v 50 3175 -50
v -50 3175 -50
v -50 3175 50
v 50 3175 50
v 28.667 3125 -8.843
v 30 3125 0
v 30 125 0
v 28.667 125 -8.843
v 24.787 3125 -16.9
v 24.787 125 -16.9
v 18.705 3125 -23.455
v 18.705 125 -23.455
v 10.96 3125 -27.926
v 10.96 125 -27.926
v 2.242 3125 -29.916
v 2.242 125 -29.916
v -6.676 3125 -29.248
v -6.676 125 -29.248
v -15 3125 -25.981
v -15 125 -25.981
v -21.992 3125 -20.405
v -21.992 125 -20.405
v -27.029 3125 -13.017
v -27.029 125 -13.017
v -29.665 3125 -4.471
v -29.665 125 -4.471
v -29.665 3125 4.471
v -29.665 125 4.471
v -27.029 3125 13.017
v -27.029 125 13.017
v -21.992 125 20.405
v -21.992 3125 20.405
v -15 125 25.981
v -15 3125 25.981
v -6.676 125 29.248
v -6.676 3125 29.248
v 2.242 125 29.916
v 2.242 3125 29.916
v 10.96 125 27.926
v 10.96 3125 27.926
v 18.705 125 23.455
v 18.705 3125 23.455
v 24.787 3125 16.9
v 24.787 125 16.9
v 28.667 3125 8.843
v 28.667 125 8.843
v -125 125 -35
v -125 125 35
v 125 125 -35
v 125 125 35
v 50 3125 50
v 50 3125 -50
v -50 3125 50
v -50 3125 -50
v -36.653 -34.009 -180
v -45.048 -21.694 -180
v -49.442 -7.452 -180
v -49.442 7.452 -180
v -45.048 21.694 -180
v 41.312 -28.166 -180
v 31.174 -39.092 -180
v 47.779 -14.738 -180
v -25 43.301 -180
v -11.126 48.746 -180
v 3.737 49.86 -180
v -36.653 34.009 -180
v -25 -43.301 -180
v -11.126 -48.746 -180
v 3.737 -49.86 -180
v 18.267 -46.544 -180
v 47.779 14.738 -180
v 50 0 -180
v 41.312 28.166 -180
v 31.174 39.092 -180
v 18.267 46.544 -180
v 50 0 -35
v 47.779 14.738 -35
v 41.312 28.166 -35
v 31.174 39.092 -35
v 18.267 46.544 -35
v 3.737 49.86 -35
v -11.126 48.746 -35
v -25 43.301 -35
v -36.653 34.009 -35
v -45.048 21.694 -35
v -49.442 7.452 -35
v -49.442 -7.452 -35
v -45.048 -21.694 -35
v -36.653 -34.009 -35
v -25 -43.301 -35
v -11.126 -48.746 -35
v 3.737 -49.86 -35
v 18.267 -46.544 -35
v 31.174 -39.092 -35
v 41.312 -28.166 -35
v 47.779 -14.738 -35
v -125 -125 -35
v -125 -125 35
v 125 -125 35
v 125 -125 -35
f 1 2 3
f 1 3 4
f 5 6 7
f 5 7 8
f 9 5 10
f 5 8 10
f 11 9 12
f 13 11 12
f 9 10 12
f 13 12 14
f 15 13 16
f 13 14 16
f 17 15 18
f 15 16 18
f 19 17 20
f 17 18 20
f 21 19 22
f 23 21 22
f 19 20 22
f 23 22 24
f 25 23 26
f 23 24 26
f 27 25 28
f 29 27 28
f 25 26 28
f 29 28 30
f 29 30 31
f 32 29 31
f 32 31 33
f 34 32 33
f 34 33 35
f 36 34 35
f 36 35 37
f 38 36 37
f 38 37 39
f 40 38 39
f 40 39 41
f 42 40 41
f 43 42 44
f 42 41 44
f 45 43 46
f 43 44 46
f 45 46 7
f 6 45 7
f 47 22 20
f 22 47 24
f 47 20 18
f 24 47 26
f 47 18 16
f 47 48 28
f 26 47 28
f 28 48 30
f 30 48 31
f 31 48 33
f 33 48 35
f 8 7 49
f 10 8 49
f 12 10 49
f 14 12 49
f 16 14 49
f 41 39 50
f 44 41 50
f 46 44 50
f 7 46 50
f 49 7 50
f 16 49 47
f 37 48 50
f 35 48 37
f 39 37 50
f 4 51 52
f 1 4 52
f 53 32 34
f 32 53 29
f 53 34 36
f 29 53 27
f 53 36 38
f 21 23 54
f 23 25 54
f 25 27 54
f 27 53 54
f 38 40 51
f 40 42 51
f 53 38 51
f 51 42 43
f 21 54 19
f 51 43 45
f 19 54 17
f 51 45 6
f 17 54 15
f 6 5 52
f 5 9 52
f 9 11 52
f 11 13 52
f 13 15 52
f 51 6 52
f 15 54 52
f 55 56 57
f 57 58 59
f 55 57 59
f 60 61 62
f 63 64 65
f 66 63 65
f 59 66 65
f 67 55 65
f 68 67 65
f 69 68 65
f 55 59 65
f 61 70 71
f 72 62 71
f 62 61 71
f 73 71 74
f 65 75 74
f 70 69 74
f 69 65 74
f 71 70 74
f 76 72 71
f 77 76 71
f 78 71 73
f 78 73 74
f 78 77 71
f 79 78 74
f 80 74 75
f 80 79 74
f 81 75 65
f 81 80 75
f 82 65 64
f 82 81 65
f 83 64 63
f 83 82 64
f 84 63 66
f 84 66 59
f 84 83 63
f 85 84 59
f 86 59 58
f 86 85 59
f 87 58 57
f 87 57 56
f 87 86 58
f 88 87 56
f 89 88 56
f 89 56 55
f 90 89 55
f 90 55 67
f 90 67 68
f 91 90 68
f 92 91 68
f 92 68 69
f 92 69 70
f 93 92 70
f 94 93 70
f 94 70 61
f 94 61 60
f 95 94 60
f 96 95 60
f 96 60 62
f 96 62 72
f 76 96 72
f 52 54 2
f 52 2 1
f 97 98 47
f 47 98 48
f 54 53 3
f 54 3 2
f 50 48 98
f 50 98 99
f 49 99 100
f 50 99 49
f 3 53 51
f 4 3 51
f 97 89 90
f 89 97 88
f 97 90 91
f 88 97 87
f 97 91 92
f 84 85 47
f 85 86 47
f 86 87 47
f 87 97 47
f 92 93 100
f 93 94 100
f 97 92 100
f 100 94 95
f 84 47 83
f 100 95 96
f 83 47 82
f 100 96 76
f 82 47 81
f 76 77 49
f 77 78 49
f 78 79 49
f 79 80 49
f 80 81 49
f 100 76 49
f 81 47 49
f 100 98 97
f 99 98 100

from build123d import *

# Parameters (mm, degrees)
SKETCH_260_W      = 250
SKETCH_260_H      = 250
EXTRUDE_381_DEPTH = 35
EXTRUDE_START     = 125
SKETCH_427_R      = 30
EXTRUDE_458_DEPTH = 3000
SKETCH_521_W      = 100
SKETCH_521_H      = 100
EXTRUDE_612_DEPTH = 50
SKETCH_664_R      = 50
EXTRUDE_692_DEPTH = 180


with BuildPart() as part:
    # Sketch 260 → Extrude 381 (new, symmetric)
    with BuildSketch(Plane.XY):
        Rectangle(SKETCH_260_W, SKETCH_260_H)
    extrude(amount=EXTRUDE_381_DEPTH, both=True)

    # Sketch 427 → Extrude 458 (add)
    with BuildSketch(Plane(origin=(0, 0, 0), x_dir=(1, 0, 0), z_dir=(0, 1, 0)).offset(EXTRUDE_START)):
        Circle(SKETCH_427_R)
    extrude(amount=EXTRUDE_458_DEPTH)

    # Sketch 521 → Extrude 612 (add)
    with BuildSketch(Plane(origin=(0, 3125, 0), x_dir=(1, 0, 0), z_dir=(0, 1, 0))):
        Rectangle(SKETCH_521_W, SKETCH_521_H)
    extrude(amount=EXTRUDE_612_DEPTH)

    # Sketch 664 → Extrude 692 (add)
    with BuildSketch(Plane.XY):
        Circle(SKETCH_664_R)
    extrude(amount=-EXTRUDE_692_DEPTH)


solid = part.part
